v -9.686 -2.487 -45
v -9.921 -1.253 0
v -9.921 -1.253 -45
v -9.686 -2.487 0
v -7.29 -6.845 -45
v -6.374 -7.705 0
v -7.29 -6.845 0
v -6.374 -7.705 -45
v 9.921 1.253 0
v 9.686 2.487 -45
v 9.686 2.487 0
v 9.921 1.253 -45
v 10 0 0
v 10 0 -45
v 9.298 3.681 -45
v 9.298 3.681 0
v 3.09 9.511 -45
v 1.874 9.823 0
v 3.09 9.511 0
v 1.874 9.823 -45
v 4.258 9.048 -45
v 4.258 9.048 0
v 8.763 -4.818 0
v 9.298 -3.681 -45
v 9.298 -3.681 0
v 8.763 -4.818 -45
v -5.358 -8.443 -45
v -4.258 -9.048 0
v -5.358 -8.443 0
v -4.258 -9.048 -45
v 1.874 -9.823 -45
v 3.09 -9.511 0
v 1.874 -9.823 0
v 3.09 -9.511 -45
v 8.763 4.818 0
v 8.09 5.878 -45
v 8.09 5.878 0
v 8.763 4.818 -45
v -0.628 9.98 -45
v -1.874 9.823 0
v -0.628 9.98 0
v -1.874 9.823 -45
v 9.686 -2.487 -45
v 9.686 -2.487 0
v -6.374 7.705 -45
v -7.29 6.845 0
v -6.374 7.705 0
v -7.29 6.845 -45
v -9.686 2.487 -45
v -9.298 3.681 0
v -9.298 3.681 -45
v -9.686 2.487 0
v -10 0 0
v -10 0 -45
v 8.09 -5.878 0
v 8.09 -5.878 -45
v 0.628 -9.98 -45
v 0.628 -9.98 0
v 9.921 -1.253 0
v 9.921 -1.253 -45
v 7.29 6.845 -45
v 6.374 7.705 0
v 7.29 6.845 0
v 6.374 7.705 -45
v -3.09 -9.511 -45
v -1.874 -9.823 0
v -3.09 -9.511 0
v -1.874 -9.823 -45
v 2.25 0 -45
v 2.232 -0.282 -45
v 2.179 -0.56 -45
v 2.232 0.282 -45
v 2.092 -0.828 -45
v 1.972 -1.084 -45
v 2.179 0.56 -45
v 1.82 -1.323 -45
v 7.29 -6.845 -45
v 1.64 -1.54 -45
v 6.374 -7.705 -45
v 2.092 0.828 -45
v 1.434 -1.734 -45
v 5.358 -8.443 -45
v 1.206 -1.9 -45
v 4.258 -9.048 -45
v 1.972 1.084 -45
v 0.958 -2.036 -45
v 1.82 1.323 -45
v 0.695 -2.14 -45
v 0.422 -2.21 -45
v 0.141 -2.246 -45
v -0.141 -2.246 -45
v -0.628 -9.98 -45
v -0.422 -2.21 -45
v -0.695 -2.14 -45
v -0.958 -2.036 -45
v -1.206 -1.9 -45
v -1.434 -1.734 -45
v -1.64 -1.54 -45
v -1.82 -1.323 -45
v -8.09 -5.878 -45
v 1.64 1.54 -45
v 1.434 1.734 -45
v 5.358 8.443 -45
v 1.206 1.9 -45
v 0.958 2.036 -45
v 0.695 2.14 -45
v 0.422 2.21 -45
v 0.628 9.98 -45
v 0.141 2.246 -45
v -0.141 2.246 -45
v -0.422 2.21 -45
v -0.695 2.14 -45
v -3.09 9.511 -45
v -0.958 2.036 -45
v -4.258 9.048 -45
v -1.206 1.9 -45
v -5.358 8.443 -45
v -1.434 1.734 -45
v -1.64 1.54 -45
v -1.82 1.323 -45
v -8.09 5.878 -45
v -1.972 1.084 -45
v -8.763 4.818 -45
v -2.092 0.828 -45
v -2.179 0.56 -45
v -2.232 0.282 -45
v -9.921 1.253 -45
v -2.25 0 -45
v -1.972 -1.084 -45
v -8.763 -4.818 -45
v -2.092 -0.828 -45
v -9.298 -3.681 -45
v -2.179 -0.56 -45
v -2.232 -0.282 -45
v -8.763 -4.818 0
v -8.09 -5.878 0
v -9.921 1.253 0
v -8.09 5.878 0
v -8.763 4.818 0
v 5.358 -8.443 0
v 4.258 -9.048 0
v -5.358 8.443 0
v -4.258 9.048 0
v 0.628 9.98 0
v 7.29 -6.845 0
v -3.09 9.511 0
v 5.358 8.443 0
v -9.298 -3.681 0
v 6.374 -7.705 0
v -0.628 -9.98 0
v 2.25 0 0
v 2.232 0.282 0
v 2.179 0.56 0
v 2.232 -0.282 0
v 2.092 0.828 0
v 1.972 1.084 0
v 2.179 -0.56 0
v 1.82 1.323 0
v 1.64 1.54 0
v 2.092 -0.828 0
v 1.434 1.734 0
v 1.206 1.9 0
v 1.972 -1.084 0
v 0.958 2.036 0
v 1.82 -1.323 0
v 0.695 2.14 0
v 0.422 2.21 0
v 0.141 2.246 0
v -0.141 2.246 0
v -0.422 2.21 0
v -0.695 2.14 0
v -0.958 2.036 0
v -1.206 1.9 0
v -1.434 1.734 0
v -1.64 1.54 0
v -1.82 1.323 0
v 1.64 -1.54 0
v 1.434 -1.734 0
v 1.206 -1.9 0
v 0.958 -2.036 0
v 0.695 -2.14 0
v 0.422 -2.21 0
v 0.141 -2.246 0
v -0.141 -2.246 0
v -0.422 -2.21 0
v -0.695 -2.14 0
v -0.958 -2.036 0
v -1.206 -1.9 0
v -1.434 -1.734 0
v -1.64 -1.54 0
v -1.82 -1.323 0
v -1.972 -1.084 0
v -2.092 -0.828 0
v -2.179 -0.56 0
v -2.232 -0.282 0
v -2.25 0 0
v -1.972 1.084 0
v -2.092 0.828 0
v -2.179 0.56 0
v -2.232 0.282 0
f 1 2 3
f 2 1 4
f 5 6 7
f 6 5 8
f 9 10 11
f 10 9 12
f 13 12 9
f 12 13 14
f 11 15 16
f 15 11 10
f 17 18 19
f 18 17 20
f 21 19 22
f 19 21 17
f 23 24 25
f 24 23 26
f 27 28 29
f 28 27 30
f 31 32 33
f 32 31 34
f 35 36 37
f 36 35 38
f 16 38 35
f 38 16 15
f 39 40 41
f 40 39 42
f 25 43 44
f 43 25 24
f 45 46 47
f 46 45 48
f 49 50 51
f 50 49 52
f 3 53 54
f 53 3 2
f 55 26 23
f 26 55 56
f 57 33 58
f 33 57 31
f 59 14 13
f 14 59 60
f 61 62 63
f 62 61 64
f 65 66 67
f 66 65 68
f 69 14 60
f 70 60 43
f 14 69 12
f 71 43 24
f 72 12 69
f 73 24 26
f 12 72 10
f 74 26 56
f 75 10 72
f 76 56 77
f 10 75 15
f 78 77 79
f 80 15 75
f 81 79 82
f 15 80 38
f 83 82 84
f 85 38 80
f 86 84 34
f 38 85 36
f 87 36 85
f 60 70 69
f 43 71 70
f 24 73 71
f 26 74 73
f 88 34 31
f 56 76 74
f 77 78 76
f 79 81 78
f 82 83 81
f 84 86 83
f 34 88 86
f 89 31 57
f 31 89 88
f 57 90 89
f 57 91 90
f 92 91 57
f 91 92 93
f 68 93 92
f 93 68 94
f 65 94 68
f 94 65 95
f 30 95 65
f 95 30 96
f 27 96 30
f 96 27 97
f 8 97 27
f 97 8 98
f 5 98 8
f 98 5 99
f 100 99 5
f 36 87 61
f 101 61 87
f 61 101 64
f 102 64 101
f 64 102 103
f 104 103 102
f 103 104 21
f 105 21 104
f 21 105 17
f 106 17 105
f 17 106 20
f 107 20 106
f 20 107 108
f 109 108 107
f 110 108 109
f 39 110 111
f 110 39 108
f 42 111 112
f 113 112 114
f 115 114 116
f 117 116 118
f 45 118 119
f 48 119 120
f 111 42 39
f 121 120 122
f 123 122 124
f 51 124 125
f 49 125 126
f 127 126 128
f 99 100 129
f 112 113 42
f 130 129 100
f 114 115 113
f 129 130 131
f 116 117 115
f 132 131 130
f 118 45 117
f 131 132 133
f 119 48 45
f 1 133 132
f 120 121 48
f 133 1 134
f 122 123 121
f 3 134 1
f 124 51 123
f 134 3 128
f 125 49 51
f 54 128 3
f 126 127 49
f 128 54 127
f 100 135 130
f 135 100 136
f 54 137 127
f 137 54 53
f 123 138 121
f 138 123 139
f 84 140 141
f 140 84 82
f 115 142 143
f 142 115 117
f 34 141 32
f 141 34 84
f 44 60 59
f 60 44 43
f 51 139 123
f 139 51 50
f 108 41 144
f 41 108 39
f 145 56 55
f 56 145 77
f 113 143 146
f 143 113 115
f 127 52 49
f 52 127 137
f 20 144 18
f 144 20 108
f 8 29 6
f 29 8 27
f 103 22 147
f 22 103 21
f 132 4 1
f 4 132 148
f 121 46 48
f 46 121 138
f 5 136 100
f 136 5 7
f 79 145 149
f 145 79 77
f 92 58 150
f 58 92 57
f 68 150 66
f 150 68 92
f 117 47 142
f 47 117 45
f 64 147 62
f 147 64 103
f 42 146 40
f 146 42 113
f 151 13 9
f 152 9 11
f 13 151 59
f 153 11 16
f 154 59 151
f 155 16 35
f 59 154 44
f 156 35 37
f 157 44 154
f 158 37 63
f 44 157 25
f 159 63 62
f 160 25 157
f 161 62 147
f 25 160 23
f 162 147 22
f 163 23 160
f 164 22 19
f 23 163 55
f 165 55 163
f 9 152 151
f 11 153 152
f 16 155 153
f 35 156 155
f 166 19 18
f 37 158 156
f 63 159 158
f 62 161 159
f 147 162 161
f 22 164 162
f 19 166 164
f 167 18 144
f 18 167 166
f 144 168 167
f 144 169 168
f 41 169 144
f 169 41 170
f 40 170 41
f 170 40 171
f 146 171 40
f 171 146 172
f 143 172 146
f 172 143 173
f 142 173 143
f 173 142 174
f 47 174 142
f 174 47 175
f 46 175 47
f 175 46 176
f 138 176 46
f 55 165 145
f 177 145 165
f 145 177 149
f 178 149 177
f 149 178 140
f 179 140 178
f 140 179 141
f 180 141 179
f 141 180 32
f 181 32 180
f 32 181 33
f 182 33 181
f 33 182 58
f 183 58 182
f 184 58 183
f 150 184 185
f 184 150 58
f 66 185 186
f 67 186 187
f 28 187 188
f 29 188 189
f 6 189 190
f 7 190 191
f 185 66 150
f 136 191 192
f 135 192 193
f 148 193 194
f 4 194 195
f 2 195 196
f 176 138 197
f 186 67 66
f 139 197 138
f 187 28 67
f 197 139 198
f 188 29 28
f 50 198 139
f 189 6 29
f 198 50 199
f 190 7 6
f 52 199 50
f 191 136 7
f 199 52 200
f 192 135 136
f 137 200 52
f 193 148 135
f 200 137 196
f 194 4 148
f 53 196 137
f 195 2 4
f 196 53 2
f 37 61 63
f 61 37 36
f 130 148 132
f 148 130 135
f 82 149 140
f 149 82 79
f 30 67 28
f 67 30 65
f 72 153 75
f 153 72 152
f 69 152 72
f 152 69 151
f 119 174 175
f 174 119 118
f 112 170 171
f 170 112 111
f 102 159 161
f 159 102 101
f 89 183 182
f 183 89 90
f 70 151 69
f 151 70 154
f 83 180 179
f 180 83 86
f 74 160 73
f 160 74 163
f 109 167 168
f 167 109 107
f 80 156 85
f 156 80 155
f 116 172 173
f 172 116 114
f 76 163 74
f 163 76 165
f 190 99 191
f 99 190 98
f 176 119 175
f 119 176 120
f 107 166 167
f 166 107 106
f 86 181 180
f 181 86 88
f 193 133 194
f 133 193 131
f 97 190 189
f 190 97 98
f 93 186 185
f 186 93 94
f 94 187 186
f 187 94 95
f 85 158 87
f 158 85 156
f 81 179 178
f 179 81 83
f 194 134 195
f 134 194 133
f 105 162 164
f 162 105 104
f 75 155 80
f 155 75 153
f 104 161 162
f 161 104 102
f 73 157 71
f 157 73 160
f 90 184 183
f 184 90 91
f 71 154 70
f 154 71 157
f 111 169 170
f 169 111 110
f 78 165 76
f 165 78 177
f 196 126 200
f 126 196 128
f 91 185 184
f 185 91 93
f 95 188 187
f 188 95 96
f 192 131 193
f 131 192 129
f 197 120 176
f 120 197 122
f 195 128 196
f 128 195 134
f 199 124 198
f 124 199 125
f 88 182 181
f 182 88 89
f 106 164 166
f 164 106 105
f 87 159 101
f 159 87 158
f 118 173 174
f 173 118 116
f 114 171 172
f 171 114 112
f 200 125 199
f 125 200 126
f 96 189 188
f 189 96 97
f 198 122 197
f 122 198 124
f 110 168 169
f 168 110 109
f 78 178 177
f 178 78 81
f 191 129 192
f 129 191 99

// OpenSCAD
$fn = 50;


difference() {
	union() {
		translate(v = [0, 0, -45.0000000000]) {
			cylinder(h = 45, r = 10.0000000000);
		}
	}
	union() {
		#translate(v = [0, 0, -45]) {
			cylinder(h = 45, r = 2.2500000000);
		}
	}
}
